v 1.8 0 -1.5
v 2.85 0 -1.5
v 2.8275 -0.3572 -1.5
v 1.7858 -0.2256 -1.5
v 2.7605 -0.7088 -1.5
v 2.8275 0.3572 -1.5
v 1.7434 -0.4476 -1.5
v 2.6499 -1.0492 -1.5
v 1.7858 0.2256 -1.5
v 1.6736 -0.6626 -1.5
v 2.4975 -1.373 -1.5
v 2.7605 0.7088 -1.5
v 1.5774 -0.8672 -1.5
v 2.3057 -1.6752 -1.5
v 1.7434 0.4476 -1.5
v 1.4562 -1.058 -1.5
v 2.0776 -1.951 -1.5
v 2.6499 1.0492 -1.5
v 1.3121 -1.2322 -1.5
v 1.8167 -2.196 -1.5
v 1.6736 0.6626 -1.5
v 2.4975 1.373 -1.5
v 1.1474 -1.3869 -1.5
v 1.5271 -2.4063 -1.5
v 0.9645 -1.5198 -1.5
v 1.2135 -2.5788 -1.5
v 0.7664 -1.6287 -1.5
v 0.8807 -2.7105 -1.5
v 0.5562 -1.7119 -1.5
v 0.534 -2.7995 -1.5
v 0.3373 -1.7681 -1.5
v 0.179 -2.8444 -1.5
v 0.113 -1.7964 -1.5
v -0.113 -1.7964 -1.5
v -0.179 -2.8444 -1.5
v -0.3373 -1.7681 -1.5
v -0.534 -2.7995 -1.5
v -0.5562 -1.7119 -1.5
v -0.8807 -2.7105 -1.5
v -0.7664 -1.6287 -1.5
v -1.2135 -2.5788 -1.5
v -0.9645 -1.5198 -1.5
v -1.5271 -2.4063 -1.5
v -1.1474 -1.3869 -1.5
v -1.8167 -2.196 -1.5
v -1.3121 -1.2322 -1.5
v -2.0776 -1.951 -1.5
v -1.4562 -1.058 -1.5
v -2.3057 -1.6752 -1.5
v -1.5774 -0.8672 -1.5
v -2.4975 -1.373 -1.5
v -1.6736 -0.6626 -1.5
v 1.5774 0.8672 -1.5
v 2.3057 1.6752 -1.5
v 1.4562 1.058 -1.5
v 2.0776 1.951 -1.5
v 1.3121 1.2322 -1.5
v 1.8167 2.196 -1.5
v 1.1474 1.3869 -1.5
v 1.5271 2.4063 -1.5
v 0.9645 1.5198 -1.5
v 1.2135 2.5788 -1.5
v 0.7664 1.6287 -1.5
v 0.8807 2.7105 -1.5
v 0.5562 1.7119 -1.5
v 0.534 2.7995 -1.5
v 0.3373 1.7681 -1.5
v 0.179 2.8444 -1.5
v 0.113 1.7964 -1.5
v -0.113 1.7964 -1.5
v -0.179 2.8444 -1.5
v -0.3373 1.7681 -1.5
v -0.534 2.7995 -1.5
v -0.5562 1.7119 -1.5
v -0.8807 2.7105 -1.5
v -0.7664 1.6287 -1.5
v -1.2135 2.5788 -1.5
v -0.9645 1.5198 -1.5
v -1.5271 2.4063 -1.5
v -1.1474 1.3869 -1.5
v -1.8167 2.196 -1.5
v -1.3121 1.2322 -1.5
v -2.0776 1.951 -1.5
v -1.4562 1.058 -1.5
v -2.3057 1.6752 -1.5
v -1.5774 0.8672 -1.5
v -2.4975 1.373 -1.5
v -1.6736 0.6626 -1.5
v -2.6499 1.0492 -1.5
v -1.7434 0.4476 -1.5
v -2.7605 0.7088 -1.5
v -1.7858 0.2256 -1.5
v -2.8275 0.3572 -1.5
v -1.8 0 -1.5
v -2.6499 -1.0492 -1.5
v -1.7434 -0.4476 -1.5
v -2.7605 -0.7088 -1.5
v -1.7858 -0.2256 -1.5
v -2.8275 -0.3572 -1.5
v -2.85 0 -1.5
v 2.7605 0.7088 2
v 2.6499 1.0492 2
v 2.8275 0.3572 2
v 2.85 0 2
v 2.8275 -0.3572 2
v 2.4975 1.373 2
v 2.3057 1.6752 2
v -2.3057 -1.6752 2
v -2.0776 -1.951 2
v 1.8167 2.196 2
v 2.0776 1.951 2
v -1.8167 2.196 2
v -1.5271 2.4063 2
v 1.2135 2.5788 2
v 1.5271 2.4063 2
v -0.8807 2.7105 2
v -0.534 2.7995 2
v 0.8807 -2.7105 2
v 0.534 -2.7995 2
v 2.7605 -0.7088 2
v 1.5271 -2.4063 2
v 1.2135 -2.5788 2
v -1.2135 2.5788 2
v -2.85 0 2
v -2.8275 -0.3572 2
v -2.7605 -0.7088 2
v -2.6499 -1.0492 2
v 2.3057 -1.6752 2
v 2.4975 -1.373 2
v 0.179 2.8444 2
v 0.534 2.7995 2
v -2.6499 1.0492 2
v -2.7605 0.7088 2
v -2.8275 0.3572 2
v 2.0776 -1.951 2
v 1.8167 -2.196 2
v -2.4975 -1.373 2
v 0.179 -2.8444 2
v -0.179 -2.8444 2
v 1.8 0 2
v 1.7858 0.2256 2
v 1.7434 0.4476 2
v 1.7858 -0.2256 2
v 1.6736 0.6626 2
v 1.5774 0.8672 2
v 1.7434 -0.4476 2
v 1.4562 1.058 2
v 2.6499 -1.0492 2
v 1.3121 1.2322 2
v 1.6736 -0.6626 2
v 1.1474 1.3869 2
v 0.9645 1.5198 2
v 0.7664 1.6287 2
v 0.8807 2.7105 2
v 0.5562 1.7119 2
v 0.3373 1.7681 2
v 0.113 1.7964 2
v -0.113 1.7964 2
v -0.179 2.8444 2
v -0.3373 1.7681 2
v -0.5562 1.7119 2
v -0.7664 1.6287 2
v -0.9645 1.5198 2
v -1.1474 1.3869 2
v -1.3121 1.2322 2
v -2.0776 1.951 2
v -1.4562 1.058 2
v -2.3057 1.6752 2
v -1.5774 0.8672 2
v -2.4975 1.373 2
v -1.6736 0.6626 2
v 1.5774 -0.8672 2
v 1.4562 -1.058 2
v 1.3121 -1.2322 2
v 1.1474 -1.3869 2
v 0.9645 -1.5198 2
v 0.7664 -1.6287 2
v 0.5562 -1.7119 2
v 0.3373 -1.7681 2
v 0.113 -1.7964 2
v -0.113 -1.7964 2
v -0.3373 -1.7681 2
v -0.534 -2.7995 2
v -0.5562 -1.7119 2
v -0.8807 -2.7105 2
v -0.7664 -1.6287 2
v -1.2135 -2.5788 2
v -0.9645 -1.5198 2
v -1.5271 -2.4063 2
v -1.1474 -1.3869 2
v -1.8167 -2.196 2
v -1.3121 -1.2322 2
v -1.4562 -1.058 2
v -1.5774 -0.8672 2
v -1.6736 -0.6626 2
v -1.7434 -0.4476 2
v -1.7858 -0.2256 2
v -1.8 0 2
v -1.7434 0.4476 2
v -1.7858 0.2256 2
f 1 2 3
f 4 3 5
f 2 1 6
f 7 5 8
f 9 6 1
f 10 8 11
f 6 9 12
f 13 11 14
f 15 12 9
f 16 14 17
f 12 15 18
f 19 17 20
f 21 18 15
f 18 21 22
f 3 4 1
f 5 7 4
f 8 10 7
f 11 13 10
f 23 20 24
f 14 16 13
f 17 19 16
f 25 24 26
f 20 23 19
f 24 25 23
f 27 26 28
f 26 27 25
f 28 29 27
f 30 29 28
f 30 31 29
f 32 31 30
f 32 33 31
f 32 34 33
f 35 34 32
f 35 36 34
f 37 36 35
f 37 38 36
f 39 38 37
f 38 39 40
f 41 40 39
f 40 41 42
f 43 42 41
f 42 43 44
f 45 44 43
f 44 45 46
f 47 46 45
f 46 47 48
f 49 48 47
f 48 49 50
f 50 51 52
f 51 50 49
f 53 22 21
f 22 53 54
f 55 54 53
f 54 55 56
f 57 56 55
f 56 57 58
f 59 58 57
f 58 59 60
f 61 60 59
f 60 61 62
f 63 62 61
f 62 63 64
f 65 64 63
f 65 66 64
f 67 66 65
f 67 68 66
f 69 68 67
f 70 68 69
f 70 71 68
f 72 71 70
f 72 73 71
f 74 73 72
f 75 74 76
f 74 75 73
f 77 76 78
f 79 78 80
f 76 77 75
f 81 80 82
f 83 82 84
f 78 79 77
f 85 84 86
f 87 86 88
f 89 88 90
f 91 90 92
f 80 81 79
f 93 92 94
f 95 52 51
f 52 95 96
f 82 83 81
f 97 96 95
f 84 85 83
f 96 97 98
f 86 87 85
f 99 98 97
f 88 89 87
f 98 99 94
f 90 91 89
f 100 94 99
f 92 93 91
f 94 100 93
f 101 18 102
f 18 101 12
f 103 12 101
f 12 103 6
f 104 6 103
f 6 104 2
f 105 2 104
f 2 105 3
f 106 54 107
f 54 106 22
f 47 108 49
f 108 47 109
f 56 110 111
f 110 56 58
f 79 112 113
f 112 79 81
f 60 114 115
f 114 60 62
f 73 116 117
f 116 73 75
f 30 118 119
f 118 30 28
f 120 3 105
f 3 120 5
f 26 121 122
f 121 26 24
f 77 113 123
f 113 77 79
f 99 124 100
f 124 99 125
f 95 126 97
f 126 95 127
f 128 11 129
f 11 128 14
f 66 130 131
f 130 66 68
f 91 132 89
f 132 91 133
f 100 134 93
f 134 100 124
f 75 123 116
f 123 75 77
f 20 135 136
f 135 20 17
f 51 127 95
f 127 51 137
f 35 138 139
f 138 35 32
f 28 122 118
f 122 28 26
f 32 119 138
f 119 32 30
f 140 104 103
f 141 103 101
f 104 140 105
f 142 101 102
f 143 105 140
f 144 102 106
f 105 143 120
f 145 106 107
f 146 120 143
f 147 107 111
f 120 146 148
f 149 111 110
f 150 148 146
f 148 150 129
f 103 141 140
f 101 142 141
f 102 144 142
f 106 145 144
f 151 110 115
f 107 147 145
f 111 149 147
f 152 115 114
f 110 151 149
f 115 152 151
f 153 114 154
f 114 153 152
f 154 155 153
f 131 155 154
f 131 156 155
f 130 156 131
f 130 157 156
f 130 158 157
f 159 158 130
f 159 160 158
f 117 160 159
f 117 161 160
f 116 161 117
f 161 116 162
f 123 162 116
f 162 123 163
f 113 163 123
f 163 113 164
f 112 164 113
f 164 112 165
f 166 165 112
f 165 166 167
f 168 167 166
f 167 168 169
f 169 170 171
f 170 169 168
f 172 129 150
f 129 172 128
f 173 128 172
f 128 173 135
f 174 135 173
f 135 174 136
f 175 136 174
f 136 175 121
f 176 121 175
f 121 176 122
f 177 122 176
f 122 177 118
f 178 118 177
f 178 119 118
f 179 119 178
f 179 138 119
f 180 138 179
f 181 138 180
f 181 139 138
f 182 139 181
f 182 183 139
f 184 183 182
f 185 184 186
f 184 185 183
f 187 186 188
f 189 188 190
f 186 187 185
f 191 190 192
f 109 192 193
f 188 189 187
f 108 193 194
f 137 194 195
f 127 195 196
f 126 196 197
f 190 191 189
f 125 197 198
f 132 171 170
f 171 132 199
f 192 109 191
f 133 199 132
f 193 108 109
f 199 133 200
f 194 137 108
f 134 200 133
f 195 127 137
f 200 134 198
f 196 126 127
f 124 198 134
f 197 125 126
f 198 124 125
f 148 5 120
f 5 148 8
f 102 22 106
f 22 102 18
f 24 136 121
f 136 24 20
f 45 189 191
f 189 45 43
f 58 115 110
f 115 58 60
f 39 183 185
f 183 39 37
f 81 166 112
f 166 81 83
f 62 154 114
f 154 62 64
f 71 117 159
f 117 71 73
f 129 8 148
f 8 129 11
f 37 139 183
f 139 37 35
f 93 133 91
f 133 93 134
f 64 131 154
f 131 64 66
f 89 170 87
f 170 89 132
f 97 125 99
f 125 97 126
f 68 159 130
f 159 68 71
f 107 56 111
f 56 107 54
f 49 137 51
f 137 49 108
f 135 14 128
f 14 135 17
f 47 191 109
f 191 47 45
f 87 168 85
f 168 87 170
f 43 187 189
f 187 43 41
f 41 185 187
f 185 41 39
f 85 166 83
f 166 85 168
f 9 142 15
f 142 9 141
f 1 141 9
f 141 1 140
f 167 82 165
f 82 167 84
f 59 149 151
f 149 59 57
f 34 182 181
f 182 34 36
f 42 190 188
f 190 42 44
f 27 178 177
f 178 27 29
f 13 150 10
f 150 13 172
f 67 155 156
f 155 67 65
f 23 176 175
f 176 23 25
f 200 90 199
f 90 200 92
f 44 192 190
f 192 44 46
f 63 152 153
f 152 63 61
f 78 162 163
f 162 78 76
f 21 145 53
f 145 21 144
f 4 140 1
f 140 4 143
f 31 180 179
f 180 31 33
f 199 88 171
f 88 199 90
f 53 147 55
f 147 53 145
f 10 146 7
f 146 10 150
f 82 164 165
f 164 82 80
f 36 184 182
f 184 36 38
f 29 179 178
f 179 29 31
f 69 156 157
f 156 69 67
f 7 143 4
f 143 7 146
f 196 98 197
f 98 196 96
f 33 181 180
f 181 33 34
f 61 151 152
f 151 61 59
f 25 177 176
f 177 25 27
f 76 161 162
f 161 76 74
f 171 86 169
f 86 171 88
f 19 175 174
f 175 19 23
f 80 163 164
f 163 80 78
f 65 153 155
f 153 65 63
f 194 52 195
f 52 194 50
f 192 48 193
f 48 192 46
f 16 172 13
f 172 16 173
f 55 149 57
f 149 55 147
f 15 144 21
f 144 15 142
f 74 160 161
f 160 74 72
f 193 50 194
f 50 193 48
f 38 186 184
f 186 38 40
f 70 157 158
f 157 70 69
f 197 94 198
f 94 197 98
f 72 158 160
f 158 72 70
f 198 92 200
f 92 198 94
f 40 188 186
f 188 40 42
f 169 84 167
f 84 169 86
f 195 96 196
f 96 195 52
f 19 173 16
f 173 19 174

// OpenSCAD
$fn = 50;


difference() {
	union() {
		translate(v = [0, 0, -1.5000000000]) {
			cylinder(h = 3, r = 1.0000000000);
		}
		translate(v = [0, 0, -1.5000000000]) {
			cylinder(h = 3.5000000000, r = 2.8500000000);
		}
	}
	union() {
		translate(v = [0, 0, -100.0000000000]) {
			cylinder(h = 200, r = 1.8000000000);
		}
	}
}
